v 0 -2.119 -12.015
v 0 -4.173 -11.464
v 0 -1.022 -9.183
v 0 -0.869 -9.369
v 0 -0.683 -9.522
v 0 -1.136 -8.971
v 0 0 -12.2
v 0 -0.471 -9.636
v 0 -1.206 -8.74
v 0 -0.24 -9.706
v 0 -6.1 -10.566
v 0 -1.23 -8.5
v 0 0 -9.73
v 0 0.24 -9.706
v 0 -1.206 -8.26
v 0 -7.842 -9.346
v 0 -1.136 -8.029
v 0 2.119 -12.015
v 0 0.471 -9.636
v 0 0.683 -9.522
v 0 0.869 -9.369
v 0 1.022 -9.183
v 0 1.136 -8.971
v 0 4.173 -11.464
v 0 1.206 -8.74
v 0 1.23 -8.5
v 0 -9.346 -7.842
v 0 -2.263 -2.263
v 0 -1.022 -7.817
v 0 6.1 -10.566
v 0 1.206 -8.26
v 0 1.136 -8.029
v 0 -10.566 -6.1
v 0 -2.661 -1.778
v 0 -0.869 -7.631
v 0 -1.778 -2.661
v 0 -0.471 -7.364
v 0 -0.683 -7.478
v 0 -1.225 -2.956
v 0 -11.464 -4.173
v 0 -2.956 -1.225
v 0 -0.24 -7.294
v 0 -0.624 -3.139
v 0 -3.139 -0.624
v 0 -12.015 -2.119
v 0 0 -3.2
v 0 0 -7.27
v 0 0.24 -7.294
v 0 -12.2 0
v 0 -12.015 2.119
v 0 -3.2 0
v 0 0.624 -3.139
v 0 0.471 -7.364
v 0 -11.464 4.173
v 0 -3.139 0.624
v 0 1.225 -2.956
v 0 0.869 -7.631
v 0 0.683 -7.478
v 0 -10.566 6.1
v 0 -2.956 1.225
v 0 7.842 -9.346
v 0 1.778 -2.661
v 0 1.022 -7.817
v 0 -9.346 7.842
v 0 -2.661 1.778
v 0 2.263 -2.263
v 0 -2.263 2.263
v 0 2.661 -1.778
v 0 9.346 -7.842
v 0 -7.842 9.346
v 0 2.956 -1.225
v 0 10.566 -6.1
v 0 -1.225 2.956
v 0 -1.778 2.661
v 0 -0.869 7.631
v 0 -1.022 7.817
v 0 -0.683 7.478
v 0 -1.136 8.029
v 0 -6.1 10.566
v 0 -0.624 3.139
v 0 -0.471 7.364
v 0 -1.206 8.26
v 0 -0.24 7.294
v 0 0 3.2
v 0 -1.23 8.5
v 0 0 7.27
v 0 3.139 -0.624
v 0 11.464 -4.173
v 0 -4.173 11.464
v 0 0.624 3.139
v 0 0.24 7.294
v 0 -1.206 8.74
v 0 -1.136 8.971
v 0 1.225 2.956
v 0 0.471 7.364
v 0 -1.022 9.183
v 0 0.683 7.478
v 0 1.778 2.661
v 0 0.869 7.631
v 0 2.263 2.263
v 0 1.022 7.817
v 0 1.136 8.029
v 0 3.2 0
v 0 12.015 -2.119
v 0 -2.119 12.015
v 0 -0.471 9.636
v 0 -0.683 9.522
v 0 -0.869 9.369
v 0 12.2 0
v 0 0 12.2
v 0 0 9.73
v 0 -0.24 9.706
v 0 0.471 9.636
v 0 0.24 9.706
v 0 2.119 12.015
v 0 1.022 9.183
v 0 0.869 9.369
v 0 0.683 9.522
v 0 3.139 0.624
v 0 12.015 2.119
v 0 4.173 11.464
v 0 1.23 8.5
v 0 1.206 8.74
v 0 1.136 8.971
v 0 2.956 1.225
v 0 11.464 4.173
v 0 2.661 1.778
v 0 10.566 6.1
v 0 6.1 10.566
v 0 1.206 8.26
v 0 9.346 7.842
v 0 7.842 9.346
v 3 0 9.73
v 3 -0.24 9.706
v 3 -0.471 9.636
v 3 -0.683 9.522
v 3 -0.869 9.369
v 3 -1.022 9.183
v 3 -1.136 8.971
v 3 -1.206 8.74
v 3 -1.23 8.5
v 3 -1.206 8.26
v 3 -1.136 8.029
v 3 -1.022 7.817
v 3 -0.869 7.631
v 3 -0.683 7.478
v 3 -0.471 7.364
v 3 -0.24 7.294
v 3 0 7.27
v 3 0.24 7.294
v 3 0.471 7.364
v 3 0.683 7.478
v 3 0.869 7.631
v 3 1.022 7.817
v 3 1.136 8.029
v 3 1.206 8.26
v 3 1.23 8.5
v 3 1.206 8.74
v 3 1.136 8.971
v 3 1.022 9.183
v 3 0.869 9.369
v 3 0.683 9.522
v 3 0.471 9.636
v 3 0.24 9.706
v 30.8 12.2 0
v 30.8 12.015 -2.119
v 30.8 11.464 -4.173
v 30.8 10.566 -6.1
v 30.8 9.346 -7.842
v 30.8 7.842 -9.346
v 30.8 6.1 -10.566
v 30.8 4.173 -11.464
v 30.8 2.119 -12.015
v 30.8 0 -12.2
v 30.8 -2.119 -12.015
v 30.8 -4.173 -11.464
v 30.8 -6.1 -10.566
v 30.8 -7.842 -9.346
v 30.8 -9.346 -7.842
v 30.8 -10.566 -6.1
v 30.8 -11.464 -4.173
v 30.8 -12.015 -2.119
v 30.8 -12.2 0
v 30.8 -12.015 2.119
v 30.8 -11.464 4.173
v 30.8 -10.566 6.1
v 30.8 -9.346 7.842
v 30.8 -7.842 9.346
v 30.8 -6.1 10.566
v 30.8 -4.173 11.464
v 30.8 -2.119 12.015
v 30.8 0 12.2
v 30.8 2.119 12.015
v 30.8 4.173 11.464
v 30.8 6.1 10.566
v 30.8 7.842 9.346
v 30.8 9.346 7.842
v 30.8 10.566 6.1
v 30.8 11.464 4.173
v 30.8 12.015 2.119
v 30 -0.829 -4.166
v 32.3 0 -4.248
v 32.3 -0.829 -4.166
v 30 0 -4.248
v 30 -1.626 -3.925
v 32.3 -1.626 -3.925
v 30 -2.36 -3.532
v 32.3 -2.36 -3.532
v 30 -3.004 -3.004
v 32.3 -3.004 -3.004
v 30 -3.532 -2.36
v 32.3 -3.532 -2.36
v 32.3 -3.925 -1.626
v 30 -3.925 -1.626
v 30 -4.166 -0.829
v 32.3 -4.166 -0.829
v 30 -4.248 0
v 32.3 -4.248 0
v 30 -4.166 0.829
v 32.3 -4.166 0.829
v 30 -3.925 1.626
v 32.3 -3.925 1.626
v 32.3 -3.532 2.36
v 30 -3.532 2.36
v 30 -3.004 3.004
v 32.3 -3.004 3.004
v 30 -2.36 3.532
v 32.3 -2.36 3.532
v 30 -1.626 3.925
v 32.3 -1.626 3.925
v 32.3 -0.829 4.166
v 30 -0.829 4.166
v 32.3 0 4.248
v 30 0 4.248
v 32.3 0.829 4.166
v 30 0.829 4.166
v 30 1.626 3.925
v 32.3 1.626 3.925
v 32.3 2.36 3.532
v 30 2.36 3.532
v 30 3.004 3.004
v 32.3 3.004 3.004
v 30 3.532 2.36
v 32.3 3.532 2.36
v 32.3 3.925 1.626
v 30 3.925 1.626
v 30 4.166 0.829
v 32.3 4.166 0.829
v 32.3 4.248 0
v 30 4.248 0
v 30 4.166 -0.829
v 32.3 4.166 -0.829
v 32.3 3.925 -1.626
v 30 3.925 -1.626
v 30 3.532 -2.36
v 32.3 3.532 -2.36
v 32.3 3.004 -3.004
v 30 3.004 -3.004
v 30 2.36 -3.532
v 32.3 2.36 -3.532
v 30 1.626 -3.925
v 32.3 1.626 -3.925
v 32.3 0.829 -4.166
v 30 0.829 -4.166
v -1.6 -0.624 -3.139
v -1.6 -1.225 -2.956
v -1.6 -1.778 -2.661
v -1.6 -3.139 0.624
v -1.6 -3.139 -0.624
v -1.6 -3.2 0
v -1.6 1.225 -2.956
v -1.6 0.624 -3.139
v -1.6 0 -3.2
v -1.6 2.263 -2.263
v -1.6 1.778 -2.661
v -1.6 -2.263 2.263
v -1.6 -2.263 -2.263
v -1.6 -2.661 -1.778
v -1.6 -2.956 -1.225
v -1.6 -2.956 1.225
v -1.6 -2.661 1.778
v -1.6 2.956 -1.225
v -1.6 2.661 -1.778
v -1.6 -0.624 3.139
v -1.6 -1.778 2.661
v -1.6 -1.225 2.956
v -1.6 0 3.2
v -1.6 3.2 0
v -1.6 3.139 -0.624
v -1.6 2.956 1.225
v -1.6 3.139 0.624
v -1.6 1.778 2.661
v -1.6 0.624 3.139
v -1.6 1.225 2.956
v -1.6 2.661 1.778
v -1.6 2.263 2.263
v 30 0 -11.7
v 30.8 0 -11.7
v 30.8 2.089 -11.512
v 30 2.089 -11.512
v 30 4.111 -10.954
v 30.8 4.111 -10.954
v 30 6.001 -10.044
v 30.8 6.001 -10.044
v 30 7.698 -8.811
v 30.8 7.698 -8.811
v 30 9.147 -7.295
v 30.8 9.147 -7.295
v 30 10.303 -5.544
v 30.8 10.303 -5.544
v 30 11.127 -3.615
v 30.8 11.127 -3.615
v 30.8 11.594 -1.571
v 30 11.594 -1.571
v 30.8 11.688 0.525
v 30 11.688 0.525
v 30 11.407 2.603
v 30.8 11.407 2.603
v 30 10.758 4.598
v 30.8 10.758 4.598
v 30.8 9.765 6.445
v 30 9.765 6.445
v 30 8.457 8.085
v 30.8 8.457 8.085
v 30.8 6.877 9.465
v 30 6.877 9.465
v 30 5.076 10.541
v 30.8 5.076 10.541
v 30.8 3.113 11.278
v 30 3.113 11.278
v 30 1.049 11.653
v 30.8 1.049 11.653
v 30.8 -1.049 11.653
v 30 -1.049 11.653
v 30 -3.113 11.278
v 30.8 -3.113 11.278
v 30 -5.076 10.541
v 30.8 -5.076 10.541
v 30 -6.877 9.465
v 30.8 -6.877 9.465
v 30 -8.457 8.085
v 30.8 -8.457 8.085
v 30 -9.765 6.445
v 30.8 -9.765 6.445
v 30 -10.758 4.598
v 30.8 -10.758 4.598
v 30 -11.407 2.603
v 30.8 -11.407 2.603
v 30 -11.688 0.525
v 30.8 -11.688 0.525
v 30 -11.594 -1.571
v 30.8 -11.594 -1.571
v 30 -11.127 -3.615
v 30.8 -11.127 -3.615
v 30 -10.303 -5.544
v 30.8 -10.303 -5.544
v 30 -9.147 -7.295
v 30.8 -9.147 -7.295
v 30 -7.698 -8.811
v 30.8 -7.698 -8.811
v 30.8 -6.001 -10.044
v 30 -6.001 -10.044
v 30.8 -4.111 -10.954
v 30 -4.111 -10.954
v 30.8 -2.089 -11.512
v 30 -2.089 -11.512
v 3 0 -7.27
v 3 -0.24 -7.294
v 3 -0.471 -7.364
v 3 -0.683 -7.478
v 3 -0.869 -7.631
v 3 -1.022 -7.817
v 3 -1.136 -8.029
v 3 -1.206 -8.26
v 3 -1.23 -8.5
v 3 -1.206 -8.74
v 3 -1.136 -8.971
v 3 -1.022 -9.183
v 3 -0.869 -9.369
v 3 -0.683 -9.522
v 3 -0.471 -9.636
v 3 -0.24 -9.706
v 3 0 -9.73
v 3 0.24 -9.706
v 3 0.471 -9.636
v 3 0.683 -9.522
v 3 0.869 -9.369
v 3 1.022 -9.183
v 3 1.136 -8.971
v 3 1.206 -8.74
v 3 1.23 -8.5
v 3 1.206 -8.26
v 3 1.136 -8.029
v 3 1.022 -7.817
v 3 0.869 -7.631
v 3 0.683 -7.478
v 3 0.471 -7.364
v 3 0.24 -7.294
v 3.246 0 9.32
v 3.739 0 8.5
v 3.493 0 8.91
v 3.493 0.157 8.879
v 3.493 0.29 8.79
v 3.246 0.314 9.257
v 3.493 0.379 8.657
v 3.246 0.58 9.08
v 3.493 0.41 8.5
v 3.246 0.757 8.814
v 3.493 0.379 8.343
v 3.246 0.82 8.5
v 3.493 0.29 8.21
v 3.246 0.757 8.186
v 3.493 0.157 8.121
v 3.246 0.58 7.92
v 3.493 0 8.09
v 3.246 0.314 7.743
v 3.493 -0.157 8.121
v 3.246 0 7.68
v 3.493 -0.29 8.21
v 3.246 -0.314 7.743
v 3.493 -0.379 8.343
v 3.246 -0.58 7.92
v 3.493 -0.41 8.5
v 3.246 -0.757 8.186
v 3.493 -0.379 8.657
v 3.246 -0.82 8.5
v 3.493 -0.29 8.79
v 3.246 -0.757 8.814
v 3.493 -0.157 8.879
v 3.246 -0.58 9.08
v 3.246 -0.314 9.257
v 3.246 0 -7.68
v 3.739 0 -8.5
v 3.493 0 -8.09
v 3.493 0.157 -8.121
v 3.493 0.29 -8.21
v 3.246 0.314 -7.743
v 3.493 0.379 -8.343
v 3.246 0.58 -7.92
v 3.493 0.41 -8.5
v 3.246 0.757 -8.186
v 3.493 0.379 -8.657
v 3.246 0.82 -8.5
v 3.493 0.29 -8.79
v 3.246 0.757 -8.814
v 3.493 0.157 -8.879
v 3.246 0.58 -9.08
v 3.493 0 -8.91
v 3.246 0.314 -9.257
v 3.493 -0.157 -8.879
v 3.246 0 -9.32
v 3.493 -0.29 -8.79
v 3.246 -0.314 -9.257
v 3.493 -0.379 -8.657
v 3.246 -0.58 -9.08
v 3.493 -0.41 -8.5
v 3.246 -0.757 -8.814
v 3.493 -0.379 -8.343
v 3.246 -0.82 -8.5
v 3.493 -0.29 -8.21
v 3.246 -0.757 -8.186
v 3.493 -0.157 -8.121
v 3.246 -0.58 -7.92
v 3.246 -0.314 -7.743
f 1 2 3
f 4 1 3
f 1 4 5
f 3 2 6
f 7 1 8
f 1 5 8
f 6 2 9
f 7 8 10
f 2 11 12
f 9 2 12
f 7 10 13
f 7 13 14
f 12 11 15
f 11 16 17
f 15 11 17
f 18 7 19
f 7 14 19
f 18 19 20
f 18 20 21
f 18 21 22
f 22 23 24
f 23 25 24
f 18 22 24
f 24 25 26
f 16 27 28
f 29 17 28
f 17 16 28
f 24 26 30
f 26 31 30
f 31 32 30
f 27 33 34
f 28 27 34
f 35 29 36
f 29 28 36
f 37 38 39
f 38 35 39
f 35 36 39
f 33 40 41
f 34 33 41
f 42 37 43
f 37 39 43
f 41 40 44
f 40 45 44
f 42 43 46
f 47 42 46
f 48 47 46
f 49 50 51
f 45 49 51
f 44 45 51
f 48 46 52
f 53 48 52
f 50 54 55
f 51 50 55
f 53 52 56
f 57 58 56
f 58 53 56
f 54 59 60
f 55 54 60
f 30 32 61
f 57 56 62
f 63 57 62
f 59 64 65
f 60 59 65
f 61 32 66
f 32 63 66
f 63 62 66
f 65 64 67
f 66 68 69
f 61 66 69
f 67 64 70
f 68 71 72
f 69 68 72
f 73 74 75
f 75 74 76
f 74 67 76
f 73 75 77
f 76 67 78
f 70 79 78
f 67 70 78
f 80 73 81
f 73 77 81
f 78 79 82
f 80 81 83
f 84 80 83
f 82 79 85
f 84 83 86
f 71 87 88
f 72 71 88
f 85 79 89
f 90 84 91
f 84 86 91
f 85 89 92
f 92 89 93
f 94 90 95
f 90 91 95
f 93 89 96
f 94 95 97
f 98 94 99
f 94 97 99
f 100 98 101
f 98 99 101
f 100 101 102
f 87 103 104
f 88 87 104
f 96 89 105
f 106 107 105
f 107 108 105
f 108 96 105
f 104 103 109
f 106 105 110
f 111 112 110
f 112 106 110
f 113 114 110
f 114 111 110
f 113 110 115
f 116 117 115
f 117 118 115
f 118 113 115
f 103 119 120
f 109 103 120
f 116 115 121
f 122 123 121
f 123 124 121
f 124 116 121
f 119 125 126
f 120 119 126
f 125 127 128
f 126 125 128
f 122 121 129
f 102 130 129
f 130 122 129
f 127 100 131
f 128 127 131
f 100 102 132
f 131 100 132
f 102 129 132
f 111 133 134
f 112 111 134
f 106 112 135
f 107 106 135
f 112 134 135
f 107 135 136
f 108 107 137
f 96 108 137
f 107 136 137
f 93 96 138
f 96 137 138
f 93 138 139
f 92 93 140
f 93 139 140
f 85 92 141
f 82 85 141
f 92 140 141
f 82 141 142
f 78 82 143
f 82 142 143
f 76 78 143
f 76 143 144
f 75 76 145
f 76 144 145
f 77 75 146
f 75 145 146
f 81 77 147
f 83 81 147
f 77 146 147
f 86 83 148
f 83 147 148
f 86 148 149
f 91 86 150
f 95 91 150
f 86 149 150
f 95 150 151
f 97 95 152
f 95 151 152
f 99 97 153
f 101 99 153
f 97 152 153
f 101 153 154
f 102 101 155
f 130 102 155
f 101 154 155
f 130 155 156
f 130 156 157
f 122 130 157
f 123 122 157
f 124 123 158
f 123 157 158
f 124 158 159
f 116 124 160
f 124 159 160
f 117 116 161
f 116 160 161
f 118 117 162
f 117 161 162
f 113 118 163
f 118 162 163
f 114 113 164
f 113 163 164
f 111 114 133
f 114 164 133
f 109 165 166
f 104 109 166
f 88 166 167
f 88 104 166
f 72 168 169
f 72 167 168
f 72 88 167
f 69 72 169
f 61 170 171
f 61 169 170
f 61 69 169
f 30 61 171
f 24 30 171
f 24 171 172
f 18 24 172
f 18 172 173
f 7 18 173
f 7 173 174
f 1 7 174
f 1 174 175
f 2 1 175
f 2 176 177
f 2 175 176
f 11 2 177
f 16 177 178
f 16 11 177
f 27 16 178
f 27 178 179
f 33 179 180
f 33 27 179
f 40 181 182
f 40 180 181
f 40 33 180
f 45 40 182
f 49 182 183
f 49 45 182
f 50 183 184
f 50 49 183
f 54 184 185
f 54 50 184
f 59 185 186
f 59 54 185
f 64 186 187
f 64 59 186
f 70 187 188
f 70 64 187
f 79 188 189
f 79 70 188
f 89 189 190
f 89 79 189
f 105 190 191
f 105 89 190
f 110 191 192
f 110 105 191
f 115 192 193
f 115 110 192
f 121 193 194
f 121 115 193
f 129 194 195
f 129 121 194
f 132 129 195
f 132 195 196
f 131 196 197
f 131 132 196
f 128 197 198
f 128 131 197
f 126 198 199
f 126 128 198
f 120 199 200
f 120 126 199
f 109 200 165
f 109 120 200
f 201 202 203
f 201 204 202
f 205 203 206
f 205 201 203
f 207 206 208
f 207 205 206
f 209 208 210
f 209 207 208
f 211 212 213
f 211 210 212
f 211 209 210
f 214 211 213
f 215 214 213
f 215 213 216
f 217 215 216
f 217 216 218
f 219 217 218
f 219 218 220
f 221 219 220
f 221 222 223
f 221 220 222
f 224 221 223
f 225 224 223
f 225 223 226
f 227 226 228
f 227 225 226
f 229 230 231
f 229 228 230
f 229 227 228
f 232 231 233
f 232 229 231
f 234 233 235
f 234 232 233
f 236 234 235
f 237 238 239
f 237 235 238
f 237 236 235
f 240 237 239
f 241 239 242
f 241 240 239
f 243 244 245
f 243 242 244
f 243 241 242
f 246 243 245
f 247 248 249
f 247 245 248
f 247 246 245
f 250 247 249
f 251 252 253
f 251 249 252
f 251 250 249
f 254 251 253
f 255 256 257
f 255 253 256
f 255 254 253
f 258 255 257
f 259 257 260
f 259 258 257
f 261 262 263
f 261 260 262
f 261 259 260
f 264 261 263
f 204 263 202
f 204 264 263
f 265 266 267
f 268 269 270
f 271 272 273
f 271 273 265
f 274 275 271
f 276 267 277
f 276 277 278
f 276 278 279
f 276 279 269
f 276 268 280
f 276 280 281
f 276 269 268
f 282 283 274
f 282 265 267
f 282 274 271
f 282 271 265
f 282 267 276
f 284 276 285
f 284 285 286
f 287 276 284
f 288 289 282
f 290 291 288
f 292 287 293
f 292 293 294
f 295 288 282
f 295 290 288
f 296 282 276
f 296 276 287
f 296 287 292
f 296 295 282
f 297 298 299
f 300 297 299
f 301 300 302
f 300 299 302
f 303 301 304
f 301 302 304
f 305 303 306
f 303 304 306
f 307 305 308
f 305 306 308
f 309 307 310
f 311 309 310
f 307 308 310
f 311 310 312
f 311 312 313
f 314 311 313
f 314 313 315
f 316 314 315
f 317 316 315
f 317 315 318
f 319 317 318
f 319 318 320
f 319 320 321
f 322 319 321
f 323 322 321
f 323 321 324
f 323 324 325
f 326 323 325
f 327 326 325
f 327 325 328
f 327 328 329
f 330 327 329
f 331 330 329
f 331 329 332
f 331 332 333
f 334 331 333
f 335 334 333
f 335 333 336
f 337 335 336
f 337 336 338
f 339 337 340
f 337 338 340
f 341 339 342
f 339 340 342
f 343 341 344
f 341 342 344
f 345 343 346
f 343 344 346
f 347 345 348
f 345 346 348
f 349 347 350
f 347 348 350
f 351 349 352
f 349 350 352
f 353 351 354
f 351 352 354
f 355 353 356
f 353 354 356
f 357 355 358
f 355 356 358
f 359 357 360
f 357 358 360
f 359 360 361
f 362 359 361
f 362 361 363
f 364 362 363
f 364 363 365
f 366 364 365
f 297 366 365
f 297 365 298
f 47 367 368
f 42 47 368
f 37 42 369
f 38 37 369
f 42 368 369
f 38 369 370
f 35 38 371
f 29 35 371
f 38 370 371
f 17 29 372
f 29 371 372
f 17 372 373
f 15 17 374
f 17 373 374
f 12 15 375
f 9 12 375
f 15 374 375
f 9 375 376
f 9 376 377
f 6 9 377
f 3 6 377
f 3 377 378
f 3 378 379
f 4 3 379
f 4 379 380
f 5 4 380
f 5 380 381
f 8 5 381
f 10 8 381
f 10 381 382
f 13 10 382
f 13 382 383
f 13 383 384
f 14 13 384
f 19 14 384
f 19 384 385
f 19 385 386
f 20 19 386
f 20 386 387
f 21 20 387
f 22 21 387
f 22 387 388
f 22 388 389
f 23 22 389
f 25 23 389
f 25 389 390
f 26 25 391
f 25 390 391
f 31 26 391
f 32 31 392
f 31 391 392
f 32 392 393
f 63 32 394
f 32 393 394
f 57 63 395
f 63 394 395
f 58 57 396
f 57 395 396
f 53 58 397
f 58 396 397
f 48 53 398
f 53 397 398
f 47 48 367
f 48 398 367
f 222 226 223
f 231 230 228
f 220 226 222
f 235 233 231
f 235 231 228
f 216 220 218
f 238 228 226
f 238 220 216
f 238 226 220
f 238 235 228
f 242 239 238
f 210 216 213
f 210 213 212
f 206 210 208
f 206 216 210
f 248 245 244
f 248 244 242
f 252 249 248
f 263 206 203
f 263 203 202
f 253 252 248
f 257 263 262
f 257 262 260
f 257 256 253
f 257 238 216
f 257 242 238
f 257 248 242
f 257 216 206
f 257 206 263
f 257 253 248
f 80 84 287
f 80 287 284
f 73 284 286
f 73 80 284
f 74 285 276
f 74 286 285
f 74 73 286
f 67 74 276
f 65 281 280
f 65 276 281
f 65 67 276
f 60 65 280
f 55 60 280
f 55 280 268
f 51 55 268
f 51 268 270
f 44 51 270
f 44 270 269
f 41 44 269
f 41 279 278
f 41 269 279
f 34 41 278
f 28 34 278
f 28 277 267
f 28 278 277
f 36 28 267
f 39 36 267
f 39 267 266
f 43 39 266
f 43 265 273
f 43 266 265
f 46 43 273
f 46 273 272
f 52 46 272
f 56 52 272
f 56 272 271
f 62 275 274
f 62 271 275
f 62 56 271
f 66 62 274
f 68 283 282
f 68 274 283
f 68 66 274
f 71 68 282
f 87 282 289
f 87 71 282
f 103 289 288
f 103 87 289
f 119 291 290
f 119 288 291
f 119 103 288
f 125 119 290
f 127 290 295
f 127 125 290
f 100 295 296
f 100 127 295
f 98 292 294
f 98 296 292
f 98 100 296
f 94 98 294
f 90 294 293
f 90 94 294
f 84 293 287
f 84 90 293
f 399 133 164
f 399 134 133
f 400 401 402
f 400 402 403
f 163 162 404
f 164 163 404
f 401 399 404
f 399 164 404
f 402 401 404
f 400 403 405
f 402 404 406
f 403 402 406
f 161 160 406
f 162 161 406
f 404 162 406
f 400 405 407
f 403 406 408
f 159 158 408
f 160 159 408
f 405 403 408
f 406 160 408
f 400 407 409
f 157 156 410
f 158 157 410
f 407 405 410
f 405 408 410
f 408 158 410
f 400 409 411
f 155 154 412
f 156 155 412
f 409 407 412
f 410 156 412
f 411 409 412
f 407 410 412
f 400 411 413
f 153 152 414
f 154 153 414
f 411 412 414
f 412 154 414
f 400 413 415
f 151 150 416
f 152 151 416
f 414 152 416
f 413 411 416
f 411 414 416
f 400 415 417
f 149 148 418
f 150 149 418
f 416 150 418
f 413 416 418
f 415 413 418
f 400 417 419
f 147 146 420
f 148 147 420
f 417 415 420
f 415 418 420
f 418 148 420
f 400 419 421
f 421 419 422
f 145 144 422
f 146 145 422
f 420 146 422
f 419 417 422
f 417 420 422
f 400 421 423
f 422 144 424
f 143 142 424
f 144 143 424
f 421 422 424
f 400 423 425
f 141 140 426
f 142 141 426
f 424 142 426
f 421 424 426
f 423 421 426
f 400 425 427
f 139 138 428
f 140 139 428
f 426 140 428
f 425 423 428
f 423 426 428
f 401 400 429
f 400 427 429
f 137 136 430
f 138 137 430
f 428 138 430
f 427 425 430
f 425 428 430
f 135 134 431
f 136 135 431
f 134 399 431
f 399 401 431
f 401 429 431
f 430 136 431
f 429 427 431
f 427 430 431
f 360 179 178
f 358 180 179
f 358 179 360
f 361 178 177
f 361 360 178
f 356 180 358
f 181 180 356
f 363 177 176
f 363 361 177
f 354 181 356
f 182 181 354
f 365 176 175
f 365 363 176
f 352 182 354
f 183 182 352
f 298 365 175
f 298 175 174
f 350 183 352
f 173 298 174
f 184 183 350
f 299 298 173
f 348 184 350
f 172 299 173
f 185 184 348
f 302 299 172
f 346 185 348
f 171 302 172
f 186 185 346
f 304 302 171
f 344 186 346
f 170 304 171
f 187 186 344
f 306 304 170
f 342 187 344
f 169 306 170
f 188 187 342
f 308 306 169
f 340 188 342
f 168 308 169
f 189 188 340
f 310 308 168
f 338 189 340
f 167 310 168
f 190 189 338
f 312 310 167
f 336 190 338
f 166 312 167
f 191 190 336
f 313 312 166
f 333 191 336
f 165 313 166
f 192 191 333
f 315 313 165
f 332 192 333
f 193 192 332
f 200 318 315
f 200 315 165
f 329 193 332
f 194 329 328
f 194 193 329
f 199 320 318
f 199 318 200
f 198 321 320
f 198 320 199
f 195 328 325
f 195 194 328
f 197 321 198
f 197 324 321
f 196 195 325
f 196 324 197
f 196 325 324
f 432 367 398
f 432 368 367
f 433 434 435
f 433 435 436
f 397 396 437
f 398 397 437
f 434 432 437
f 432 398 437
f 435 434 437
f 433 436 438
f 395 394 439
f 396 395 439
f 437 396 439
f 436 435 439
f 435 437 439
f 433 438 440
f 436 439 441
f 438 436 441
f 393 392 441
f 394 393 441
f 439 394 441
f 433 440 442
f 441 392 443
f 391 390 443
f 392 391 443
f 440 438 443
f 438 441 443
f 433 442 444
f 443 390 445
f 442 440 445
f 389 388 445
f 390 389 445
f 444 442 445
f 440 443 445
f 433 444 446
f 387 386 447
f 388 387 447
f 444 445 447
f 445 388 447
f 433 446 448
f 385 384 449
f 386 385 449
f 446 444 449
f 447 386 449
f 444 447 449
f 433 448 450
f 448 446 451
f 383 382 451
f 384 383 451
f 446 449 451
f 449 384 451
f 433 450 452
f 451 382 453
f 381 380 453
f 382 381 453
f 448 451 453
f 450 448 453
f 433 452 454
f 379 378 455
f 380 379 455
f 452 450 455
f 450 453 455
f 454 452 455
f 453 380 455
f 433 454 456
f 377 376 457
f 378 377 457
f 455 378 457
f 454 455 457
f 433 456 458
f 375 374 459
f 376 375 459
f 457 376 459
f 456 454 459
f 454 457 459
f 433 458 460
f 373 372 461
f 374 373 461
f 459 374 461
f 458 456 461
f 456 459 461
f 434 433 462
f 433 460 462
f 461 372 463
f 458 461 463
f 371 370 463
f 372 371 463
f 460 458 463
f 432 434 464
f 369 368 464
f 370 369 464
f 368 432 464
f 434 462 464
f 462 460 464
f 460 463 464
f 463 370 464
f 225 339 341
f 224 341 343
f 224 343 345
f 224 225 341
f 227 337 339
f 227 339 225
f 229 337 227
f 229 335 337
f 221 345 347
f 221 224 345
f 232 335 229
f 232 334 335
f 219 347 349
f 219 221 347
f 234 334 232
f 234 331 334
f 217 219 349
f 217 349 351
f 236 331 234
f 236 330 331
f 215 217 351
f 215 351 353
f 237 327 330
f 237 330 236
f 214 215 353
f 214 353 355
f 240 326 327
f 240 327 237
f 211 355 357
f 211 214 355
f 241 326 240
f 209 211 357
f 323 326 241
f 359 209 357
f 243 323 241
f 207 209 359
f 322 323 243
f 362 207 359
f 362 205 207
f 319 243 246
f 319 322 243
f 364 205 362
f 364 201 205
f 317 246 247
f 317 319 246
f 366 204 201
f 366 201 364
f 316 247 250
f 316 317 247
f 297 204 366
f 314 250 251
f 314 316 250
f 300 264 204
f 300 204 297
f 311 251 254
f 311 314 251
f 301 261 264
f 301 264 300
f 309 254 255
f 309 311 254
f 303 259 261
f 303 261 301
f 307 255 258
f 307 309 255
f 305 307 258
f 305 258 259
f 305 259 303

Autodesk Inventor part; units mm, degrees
ref_plane "YZ Plane" through (0, 0, 0) normal (1, 0, 0) x (0, 1, 0)
ref_plane "XZ Plane" through (0, 0, 0) normal (0, 1, 0) x (-1, 0, 0)
ref_plane "XY Plane" through (0, 0, 0) normal (0, 0, 1) x (1, 0, 0)
sketch "Szkic1" plane through (0, 0, 0) normal (1, 0, 0) x (0, 1, 0)
  circle A0 centre (0, 0) radius 12.2
  dimension "d0" = 24.4
extrude "Wyciągnięcie proste1" add sketch "Szkic1" along normal blind 30.8
sketch "Szkic2" plane through (30.8, 0, 0) normal (1, 0, 0) x (0, 0, -1)
  circle A0 centre (0, 0) radius 11.7
  dimension "d3" = 23.4
extrude "Wyciągnięcie proste2" cut sketch "Szkic2" against normal blind 0.8
sketch "Szkic3" plane through (30, 0, 0) normal (1, 0, 0) x (0, 0, -1)
  circle A0 centre (0, 0) radius 4.2479
extrude "Wyciągnięcie proste3" add sketch "Szkic3" along normal blind 2.3
sketch "Szkic4" plane through (0, 0, 0) normal (-1, 0, 0) x (0, 0, 1)
  line L0 (0, 0) -> (8.5, 0) construction
  line L1 (0, 0) -> (-8.5, 0) construction
  dimension "d8" = 8.5
hole "Otwór1" at (0, 0, 8.5) at (0, 0, -8.5) direction (1, 0, 0) diameter 2.459 depth 3 tip angle 118 thread size "M3x0.5" class "6H" standard "ISO Metric profile"
sketch "Szkic5" plane through (0, 0, 0) normal (-1, 0, 0) x (0, 0, 1)
  circle A0 centre (0, 0) radius 3.2
  dimension "d16" = 6.4
extrude "Wyciągnięcie proste4" add sketch "Szkic5" along normal blind 1.6
properties part number "Silnik"
